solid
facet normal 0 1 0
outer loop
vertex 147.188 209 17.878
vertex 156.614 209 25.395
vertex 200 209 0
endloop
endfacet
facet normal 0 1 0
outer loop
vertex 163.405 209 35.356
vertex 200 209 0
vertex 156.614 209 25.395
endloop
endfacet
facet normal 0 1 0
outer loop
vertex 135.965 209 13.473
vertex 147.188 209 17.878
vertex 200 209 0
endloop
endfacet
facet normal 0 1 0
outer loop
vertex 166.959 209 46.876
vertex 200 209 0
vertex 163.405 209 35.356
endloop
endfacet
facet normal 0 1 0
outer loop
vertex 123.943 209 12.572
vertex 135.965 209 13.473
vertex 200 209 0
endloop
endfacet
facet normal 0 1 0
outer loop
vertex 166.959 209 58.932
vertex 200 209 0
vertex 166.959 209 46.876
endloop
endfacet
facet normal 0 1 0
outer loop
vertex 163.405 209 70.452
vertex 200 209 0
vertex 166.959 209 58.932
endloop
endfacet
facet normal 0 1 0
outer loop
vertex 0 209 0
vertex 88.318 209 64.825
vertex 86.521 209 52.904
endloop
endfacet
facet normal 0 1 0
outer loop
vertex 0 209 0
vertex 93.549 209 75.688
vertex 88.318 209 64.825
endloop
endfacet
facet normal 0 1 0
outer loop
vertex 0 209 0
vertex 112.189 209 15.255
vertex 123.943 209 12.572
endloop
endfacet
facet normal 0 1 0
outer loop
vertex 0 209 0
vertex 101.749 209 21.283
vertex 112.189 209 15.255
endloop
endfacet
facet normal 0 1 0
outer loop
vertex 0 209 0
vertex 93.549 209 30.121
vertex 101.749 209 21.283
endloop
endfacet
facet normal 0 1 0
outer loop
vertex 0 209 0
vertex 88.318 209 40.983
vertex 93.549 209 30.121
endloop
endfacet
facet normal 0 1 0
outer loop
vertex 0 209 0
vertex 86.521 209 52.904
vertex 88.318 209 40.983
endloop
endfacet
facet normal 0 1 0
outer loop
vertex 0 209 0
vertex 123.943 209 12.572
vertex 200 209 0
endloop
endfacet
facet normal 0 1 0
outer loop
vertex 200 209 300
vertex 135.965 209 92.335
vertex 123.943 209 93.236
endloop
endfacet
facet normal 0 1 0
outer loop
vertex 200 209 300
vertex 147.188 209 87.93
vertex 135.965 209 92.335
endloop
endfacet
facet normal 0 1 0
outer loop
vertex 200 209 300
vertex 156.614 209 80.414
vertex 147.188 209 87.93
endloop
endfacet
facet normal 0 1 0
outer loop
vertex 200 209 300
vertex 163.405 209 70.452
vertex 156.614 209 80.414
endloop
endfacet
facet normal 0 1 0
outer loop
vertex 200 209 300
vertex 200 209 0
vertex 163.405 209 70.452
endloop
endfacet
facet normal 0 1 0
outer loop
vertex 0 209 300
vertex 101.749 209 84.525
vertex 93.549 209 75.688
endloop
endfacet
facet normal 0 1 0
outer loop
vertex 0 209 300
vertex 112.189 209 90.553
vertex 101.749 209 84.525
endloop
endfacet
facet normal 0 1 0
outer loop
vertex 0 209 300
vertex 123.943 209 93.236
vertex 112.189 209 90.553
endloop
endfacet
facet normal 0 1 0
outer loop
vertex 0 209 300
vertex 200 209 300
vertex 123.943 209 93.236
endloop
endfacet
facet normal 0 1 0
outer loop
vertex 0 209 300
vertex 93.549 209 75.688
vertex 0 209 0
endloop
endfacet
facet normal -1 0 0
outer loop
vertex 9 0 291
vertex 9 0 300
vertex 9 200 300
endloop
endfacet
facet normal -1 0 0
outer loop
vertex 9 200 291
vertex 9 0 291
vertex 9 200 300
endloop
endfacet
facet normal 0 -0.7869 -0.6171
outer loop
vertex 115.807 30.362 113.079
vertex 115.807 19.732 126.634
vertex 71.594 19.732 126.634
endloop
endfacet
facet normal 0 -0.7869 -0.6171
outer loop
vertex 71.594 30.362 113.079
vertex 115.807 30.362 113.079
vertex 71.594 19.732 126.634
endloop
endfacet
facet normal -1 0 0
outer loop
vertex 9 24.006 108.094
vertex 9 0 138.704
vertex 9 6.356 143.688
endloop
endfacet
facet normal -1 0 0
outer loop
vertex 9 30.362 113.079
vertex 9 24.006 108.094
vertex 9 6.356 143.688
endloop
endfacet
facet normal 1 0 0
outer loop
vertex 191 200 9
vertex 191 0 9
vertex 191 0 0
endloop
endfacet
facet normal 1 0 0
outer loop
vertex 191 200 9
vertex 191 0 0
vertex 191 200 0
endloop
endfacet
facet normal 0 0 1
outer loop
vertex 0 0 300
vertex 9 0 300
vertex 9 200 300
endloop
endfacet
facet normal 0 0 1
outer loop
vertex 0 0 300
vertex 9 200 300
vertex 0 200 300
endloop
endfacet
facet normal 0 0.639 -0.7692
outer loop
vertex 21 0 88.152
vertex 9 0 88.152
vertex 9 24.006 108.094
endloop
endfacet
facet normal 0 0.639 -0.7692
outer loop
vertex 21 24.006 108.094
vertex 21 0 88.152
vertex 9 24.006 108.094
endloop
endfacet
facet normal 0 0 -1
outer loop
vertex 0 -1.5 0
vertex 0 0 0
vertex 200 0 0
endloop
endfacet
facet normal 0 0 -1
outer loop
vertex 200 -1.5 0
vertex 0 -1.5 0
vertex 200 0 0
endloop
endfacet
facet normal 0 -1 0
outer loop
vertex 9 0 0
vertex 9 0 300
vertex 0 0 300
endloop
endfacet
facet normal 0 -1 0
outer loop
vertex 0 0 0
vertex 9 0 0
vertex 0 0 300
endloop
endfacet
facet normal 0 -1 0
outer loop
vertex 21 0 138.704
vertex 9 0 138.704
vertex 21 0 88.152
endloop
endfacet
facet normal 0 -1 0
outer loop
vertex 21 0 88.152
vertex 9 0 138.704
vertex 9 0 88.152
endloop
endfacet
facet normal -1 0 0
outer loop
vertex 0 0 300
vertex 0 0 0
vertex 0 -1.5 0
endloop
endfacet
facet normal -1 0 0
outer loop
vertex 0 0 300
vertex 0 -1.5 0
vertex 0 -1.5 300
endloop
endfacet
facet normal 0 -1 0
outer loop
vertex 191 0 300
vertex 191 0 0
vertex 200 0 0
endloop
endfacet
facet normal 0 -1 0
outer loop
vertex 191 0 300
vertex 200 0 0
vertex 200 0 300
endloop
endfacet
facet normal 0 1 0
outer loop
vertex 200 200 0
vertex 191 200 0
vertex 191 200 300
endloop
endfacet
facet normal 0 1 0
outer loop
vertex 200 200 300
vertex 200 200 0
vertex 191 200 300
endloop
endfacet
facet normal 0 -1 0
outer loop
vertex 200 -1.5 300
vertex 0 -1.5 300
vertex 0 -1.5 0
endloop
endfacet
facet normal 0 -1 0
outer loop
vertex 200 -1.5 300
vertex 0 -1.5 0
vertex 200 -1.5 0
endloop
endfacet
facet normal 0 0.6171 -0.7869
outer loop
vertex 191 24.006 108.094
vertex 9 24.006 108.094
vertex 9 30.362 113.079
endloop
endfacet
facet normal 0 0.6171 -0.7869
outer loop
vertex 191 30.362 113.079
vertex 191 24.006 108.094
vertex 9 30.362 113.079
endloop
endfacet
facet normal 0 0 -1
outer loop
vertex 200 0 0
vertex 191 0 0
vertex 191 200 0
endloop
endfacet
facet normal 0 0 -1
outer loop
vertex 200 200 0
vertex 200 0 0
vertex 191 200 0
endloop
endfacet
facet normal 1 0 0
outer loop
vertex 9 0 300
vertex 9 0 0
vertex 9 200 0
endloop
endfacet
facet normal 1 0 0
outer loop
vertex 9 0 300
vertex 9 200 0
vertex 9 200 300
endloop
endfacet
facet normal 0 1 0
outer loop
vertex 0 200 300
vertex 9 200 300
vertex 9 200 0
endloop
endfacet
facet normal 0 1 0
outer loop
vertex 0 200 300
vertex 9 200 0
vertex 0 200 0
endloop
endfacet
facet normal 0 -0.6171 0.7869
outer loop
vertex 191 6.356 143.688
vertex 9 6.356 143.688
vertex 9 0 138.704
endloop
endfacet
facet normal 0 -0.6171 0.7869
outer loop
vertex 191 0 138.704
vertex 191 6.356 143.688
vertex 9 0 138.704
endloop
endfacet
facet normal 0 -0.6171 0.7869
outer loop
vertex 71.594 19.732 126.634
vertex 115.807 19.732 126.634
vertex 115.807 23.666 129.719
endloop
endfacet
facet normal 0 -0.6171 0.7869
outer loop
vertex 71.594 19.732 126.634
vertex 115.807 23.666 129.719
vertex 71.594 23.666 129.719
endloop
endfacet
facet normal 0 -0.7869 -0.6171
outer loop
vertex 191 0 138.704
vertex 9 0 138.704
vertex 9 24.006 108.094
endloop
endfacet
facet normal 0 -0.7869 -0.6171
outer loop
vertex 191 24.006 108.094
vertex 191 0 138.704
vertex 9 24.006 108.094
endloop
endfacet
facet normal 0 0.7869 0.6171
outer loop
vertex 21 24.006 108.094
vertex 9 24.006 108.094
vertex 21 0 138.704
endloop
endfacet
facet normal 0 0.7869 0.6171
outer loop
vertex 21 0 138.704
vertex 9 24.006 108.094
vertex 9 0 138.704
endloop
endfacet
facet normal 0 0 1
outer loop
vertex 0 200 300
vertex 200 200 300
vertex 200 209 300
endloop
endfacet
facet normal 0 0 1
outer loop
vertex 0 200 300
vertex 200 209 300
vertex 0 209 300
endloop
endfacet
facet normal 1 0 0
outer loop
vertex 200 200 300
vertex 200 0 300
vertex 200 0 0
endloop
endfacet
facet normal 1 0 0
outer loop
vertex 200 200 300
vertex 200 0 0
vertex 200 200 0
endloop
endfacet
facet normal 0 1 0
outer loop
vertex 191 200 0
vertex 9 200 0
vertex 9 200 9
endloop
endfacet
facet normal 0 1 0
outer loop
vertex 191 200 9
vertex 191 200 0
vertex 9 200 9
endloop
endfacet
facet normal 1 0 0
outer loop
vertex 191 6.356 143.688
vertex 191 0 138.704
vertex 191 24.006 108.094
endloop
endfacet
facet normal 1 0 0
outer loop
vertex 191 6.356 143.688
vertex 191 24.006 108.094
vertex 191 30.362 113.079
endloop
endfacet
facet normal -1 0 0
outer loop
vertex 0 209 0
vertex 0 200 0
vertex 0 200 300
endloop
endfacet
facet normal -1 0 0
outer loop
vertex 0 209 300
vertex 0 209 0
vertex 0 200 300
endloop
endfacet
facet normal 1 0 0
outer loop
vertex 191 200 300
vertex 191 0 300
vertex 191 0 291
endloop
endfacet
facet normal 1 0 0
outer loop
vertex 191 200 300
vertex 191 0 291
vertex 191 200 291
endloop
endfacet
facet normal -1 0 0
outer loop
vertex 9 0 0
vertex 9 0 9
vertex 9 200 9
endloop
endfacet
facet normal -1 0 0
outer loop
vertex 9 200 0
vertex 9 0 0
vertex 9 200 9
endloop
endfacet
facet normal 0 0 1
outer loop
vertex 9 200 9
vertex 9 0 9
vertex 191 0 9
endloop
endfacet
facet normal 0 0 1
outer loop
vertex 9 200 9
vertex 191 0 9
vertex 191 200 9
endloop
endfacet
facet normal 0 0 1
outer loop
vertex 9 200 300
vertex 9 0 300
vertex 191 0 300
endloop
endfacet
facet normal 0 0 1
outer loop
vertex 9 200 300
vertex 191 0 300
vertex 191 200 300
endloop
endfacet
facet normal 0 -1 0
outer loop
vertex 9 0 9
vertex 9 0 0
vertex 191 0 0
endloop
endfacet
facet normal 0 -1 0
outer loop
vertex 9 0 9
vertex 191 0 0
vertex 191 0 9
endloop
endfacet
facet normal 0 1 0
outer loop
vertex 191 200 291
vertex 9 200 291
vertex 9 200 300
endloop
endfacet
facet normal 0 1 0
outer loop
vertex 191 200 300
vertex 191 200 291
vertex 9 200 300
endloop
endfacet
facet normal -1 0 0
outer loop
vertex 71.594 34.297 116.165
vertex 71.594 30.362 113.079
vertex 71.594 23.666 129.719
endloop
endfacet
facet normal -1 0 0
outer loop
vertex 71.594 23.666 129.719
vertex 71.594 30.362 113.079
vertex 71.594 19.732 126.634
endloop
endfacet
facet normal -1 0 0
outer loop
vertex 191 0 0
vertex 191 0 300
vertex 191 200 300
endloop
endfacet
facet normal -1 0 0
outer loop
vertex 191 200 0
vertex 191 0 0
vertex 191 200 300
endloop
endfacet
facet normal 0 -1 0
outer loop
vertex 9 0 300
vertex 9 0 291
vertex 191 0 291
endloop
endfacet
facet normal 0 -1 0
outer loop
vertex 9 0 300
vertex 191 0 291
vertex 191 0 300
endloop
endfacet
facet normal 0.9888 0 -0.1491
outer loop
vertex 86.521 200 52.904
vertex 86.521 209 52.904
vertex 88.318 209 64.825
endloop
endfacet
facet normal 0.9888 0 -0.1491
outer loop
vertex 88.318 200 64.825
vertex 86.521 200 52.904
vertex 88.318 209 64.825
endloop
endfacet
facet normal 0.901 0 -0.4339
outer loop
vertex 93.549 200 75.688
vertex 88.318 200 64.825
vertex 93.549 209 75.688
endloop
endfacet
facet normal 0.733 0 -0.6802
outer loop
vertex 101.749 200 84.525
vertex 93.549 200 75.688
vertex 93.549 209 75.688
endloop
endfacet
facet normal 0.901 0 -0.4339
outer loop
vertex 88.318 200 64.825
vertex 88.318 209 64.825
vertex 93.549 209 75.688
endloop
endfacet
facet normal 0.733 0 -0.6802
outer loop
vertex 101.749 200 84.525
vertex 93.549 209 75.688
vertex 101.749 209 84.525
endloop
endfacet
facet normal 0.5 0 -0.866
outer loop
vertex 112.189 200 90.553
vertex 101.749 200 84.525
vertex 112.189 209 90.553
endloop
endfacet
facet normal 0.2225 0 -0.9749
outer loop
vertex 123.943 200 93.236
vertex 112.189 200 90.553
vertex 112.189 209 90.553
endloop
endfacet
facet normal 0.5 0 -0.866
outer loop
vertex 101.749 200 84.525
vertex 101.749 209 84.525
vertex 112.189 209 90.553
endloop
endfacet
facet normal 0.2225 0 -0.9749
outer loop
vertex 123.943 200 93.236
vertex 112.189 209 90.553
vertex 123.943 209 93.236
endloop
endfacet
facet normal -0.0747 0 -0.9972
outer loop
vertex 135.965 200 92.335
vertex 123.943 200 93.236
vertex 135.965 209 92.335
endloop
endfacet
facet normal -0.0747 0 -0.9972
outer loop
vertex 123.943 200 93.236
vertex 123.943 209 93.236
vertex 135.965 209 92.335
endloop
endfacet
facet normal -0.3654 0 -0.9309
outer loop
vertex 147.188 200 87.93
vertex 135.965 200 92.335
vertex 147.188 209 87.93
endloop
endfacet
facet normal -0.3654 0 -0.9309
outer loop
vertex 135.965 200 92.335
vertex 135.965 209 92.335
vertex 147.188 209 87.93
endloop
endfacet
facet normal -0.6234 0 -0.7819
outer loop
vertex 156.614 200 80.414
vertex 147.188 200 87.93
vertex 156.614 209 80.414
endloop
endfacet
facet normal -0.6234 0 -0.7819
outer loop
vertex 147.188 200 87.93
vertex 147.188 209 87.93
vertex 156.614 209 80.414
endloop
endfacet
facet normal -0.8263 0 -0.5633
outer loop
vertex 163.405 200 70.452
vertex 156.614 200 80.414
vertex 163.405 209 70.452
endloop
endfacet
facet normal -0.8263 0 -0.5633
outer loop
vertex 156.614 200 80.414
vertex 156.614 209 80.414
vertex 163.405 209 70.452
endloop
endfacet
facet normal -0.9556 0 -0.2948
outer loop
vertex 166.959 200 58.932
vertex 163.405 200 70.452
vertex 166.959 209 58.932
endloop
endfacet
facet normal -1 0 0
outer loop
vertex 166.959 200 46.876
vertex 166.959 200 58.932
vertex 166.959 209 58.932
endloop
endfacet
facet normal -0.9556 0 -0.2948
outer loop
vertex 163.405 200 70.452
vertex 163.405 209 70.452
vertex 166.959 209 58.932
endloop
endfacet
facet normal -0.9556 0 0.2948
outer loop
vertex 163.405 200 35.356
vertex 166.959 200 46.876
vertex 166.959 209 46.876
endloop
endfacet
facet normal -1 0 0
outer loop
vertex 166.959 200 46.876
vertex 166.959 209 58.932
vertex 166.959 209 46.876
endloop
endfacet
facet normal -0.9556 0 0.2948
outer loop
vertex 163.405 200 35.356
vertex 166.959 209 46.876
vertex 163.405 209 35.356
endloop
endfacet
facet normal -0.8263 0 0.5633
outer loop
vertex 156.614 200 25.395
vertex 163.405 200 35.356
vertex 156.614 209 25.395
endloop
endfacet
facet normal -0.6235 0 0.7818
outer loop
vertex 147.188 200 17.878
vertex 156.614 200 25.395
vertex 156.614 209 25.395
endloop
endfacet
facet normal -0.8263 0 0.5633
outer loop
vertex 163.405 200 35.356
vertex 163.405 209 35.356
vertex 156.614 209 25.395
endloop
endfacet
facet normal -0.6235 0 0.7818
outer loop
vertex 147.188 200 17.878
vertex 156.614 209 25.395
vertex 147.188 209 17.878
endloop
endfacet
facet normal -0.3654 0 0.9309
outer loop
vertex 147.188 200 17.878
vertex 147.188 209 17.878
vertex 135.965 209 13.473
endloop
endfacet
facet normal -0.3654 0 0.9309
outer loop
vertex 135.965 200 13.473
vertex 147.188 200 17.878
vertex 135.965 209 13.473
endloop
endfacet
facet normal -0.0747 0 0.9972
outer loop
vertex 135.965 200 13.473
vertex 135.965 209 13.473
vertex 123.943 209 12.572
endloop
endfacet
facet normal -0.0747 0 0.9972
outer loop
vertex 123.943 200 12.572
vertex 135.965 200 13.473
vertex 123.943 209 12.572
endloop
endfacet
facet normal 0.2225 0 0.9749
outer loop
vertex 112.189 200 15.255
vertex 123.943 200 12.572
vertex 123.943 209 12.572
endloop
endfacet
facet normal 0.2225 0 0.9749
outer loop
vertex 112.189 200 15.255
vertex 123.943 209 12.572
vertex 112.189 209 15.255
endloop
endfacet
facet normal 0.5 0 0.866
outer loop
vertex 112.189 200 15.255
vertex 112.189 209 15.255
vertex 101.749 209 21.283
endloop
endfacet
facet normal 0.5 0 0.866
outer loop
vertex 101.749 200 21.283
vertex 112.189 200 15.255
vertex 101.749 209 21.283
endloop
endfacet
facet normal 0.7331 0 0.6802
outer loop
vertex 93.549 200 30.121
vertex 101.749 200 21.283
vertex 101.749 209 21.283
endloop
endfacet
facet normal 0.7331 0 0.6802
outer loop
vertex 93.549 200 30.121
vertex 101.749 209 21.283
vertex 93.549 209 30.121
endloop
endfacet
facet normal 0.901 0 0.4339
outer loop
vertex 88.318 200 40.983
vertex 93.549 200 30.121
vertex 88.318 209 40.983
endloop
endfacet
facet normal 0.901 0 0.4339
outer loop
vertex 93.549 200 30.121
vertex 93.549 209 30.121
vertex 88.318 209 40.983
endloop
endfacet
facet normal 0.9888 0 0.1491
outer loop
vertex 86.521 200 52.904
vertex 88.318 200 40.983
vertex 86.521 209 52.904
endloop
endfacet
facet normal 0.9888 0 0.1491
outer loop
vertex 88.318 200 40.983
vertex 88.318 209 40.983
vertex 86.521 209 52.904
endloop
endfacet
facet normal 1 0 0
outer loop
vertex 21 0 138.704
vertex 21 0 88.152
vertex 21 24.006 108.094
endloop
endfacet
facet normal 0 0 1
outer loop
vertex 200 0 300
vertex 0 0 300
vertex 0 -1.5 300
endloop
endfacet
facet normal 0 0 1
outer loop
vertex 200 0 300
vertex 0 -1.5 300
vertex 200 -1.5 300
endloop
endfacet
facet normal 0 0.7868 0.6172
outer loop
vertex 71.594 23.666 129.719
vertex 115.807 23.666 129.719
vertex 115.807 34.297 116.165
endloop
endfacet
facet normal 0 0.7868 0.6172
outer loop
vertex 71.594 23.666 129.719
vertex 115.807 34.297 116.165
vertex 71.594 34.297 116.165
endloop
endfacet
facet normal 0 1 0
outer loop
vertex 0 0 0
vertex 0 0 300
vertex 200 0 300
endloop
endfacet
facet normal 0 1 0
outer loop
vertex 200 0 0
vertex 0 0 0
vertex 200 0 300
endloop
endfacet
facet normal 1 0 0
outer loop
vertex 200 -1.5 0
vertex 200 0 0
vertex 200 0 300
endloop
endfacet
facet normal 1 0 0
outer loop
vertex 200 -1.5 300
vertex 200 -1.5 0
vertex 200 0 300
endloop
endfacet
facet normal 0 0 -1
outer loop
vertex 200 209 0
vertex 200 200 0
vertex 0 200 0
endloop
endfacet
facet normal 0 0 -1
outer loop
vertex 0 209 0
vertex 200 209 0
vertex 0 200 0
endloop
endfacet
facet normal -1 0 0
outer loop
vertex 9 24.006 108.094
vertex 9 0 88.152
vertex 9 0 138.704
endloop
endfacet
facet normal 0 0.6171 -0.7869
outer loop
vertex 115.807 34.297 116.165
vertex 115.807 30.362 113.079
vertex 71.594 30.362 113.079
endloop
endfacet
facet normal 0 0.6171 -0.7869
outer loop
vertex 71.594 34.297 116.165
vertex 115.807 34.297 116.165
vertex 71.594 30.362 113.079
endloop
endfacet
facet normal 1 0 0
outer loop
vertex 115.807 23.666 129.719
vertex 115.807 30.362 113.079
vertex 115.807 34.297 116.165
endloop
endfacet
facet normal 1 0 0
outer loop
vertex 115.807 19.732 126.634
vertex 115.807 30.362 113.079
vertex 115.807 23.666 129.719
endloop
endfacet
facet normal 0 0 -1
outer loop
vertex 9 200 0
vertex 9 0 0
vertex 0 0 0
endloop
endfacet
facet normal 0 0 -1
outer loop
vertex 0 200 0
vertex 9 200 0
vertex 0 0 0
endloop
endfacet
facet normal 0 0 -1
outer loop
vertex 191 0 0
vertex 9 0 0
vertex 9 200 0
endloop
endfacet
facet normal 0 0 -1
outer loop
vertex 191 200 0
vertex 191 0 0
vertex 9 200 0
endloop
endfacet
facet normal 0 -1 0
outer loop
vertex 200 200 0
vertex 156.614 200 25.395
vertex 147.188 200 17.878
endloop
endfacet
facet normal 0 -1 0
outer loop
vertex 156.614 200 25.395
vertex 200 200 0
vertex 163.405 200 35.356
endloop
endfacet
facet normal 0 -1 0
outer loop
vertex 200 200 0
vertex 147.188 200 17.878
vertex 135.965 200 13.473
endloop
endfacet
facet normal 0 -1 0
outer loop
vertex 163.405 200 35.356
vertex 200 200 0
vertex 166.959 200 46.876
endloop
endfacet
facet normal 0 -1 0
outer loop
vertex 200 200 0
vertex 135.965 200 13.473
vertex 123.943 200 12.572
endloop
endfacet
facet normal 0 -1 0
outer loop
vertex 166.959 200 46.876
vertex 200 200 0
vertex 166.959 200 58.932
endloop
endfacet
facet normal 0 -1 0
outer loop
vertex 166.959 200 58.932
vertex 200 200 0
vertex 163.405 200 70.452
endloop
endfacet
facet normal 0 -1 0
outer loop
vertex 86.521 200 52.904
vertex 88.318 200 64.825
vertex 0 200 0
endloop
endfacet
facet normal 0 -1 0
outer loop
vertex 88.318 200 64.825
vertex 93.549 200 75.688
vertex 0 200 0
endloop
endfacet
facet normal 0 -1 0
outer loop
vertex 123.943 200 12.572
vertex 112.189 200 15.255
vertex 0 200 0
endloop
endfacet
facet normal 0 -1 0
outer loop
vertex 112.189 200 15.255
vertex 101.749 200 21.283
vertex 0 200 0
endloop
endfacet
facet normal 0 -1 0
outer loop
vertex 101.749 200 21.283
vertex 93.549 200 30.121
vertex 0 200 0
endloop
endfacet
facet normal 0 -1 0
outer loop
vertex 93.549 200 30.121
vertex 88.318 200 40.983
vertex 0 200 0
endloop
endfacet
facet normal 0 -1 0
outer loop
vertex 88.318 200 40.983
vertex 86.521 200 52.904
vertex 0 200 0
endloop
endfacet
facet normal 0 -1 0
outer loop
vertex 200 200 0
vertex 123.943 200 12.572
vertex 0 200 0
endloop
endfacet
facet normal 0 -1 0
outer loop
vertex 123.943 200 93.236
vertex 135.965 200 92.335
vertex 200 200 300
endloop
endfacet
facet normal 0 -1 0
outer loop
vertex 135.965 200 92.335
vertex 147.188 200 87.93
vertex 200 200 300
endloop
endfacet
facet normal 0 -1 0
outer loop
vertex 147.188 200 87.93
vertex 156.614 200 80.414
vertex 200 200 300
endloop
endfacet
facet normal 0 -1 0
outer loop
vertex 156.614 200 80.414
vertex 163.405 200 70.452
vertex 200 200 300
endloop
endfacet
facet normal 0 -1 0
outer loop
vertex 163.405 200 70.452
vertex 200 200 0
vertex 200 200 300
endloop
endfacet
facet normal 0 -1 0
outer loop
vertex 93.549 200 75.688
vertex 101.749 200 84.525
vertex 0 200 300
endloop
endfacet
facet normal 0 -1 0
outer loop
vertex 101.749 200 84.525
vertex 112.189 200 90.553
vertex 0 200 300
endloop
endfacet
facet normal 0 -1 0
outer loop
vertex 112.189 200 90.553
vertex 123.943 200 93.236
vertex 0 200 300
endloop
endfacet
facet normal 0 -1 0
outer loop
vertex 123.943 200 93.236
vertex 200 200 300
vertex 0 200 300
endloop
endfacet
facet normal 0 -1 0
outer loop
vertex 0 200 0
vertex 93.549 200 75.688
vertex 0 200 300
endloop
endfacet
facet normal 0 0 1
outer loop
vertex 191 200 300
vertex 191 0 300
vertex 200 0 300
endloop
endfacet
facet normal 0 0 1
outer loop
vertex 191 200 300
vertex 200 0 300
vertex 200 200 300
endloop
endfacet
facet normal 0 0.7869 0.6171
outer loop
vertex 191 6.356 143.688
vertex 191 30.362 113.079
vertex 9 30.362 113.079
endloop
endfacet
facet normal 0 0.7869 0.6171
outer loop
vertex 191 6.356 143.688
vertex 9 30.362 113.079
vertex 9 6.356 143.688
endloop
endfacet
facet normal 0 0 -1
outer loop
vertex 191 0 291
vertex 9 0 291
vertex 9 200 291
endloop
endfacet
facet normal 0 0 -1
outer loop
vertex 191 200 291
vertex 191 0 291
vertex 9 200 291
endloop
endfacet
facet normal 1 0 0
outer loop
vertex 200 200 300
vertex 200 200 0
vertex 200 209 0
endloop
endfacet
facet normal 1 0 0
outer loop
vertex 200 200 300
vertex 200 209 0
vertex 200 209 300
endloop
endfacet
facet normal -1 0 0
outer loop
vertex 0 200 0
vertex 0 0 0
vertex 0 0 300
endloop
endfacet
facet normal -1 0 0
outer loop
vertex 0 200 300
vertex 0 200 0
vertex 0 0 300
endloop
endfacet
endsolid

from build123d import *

# Parameters (mm, degrees)
F0_W      = 200
F0_H      = 300
F1_DEPTH  = 1.5
F2_W      = 9
F2_H      = 300
F3_DEPTH  = 200
F5_DEPTH  = 12
F7_DEPTH  = 182
F8_W      = 44.2128404975
F8_H      = 17.2260019455
F9_DEPTH  = 5
F10_W     = 200
F10_H     = 9
F11_DEPTH = 182
F12_W     = 200
F12_H     = 9
F13_DEPTH = 182
F14_W     = 200
F14_H     = 300
F15_DEPTH = 9
F16_W     = 200
F16_H     = 300
F17_DEPTH = 9
F18_R     = 40.4447812264
F19_DEPTH = 9
F20_W     = 23
F20_H     = 23
F21_DEPTH = 10
F22_W     = 23
F22_H     = 23
F23_DEPTH = 10
F24_W     = 23
F24_H     = 23
F25_DEPTH = 10


# Not quite as in the source:
# - a feature names something its author has since deleted; it is built from what else it names


with BuildPart() as f1:
    # F0 (on Front) → F1 (new body)
    with BuildSketch(Plane.XZ):
        with Locations((100, 150)):
            Rectangle(F0_W, F0_H)
    extrude(amount=F1_DEPTH)


with BuildPart() as f3:
    # F2 (on face) → F3 (new body)
    with BuildSketch(Plane(origin=(0, 0, 0), x_dir=(-1, 0, 0), z_dir=(0, 1, 0))):
        with Locations((-4.5, 150)):
            Rectangle(F2_W, F2_H)
    extrude(amount=F3_DEPTH)


with BuildPart() as f5:
    # F4 (on face) → F5 (new body)
    with BuildSketch(Plane.YZ.offset(9)):
        Polygon((24.0061823279, 108.0940887332), (0, 138.7036293745), (0, 88.1515070796), align=None)
    extrude(amount=F5_DEPTH)


with BuildPart() as f7:
    # F6 (on face) → F7 (new body)
    with BuildSketch(Plane.YZ.offset(9)):
        Polygon((0, 138.7036293745), (24.0061823279, 108.0940887332), (30.3622312434, 113.0789550838), (6.3560489155, 143.6884957251), align=None)
    extrude(amount=F7_DEPTH)


with BuildPart() as f9:
    # F8 (on face) → F9 (new body)
    with BuildSketch(Plane(origin=(0, 73.7094769341, 57.8082227142), x_dir=(-1, 0, 0), z_dir=(0, 0.7868696517, 0.6171192358))):
        with Locations((-93.7001220882, 78.8542820377)):
            Rectangle(F8_W, F8_H)
    extrude(amount=F9_DEPTH)


with BuildPart() as f11:
    # F10 (on face) → F11 (new body)
    with BuildSketch(Plane.YZ.offset(9)):
        with Locations((100, 295.5)):
            Rectangle(F10_W, F10_H)
    extrude(amount=F11_DEPTH)


with BuildPart() as f13:
    # F12 (on face) → F13 (new body)
    with BuildSketch(Plane.YZ.offset(9)):
        with Locations((100, 4.5)):
            Rectangle(F12_W, F12_H)
    extrude(amount=F13_DEPTH)


with BuildPart() as f15:
    # F14 (on face) → F15 (new body)
    with BuildSketch(Plane.YZ.offset(191)):
        with Locations((100, 150)):
            Rectangle(F14_W, F14_H)
    extrude(amount=F15_DEPTH)


with BuildPart() as f17:
    # F16 (on face) → F17 (new body)
    with BuildSketch(Plane(origin=(0, 200, 0), x_dir=(-1, 0, 0), z_dir=(0, 1, 0))):
        with Locations((-100, 150)):
            Rectangle(F16_W, F16_H)
    extrude(amount=F17_DEPTH)

    # F18 (on face) → F19 (cut)
    with BuildSketch(Plane(origin=(0, 209, 0), x_dir=(-1, 0, 0), z_dir=(0, 1, 0))):
        with Locations((-126.9655525684, 52.9041551054)):
            Circle(F18_R)
    extrude(amount=-F19_DEPTH, mode=Mode.SUBTRACT)


with BuildPart() as f21:
    # F20 (on face) → F21 (new body)
    with BuildSketch(Plane(origin=(0, 0, 0), x_dir=(1, 0, 0), z_dir=(0, 0, -1))):
        with Locations((188.5, -11.5)):
            Rectangle(F20_W, F20_H)
    extrude(amount=F21_DEPTH)


with BuildPart() as f23:
    # F22 (on face) → F23 (new body)
    with BuildSketch(Plane(origin=(0, 0, 0), x_dir=(1, 0, 0), z_dir=(0, 0, -1))):
        with Locations((11.5, -197.5752720833)):
            Rectangle(F22_W, F22_H)
    extrude(amount=F23_DEPTH)


with BuildPart() as f25:
    # F24 (on face) → F25 (new body)
    with BuildSketch(Plane(origin=(0, 0, 0), x_dir=(1, 0, 0), z_dir=(0, 0, -1))):
        with Locations((188.5, -197.5)):
            Rectangle(F24_W, F24_H)
    extrude(amount=F25_DEPTH)


solid = Compound([f1.part, f3.part, f5.part, f7.part, f9.part, f11.part, f13.part, f15.part, f17.part])
